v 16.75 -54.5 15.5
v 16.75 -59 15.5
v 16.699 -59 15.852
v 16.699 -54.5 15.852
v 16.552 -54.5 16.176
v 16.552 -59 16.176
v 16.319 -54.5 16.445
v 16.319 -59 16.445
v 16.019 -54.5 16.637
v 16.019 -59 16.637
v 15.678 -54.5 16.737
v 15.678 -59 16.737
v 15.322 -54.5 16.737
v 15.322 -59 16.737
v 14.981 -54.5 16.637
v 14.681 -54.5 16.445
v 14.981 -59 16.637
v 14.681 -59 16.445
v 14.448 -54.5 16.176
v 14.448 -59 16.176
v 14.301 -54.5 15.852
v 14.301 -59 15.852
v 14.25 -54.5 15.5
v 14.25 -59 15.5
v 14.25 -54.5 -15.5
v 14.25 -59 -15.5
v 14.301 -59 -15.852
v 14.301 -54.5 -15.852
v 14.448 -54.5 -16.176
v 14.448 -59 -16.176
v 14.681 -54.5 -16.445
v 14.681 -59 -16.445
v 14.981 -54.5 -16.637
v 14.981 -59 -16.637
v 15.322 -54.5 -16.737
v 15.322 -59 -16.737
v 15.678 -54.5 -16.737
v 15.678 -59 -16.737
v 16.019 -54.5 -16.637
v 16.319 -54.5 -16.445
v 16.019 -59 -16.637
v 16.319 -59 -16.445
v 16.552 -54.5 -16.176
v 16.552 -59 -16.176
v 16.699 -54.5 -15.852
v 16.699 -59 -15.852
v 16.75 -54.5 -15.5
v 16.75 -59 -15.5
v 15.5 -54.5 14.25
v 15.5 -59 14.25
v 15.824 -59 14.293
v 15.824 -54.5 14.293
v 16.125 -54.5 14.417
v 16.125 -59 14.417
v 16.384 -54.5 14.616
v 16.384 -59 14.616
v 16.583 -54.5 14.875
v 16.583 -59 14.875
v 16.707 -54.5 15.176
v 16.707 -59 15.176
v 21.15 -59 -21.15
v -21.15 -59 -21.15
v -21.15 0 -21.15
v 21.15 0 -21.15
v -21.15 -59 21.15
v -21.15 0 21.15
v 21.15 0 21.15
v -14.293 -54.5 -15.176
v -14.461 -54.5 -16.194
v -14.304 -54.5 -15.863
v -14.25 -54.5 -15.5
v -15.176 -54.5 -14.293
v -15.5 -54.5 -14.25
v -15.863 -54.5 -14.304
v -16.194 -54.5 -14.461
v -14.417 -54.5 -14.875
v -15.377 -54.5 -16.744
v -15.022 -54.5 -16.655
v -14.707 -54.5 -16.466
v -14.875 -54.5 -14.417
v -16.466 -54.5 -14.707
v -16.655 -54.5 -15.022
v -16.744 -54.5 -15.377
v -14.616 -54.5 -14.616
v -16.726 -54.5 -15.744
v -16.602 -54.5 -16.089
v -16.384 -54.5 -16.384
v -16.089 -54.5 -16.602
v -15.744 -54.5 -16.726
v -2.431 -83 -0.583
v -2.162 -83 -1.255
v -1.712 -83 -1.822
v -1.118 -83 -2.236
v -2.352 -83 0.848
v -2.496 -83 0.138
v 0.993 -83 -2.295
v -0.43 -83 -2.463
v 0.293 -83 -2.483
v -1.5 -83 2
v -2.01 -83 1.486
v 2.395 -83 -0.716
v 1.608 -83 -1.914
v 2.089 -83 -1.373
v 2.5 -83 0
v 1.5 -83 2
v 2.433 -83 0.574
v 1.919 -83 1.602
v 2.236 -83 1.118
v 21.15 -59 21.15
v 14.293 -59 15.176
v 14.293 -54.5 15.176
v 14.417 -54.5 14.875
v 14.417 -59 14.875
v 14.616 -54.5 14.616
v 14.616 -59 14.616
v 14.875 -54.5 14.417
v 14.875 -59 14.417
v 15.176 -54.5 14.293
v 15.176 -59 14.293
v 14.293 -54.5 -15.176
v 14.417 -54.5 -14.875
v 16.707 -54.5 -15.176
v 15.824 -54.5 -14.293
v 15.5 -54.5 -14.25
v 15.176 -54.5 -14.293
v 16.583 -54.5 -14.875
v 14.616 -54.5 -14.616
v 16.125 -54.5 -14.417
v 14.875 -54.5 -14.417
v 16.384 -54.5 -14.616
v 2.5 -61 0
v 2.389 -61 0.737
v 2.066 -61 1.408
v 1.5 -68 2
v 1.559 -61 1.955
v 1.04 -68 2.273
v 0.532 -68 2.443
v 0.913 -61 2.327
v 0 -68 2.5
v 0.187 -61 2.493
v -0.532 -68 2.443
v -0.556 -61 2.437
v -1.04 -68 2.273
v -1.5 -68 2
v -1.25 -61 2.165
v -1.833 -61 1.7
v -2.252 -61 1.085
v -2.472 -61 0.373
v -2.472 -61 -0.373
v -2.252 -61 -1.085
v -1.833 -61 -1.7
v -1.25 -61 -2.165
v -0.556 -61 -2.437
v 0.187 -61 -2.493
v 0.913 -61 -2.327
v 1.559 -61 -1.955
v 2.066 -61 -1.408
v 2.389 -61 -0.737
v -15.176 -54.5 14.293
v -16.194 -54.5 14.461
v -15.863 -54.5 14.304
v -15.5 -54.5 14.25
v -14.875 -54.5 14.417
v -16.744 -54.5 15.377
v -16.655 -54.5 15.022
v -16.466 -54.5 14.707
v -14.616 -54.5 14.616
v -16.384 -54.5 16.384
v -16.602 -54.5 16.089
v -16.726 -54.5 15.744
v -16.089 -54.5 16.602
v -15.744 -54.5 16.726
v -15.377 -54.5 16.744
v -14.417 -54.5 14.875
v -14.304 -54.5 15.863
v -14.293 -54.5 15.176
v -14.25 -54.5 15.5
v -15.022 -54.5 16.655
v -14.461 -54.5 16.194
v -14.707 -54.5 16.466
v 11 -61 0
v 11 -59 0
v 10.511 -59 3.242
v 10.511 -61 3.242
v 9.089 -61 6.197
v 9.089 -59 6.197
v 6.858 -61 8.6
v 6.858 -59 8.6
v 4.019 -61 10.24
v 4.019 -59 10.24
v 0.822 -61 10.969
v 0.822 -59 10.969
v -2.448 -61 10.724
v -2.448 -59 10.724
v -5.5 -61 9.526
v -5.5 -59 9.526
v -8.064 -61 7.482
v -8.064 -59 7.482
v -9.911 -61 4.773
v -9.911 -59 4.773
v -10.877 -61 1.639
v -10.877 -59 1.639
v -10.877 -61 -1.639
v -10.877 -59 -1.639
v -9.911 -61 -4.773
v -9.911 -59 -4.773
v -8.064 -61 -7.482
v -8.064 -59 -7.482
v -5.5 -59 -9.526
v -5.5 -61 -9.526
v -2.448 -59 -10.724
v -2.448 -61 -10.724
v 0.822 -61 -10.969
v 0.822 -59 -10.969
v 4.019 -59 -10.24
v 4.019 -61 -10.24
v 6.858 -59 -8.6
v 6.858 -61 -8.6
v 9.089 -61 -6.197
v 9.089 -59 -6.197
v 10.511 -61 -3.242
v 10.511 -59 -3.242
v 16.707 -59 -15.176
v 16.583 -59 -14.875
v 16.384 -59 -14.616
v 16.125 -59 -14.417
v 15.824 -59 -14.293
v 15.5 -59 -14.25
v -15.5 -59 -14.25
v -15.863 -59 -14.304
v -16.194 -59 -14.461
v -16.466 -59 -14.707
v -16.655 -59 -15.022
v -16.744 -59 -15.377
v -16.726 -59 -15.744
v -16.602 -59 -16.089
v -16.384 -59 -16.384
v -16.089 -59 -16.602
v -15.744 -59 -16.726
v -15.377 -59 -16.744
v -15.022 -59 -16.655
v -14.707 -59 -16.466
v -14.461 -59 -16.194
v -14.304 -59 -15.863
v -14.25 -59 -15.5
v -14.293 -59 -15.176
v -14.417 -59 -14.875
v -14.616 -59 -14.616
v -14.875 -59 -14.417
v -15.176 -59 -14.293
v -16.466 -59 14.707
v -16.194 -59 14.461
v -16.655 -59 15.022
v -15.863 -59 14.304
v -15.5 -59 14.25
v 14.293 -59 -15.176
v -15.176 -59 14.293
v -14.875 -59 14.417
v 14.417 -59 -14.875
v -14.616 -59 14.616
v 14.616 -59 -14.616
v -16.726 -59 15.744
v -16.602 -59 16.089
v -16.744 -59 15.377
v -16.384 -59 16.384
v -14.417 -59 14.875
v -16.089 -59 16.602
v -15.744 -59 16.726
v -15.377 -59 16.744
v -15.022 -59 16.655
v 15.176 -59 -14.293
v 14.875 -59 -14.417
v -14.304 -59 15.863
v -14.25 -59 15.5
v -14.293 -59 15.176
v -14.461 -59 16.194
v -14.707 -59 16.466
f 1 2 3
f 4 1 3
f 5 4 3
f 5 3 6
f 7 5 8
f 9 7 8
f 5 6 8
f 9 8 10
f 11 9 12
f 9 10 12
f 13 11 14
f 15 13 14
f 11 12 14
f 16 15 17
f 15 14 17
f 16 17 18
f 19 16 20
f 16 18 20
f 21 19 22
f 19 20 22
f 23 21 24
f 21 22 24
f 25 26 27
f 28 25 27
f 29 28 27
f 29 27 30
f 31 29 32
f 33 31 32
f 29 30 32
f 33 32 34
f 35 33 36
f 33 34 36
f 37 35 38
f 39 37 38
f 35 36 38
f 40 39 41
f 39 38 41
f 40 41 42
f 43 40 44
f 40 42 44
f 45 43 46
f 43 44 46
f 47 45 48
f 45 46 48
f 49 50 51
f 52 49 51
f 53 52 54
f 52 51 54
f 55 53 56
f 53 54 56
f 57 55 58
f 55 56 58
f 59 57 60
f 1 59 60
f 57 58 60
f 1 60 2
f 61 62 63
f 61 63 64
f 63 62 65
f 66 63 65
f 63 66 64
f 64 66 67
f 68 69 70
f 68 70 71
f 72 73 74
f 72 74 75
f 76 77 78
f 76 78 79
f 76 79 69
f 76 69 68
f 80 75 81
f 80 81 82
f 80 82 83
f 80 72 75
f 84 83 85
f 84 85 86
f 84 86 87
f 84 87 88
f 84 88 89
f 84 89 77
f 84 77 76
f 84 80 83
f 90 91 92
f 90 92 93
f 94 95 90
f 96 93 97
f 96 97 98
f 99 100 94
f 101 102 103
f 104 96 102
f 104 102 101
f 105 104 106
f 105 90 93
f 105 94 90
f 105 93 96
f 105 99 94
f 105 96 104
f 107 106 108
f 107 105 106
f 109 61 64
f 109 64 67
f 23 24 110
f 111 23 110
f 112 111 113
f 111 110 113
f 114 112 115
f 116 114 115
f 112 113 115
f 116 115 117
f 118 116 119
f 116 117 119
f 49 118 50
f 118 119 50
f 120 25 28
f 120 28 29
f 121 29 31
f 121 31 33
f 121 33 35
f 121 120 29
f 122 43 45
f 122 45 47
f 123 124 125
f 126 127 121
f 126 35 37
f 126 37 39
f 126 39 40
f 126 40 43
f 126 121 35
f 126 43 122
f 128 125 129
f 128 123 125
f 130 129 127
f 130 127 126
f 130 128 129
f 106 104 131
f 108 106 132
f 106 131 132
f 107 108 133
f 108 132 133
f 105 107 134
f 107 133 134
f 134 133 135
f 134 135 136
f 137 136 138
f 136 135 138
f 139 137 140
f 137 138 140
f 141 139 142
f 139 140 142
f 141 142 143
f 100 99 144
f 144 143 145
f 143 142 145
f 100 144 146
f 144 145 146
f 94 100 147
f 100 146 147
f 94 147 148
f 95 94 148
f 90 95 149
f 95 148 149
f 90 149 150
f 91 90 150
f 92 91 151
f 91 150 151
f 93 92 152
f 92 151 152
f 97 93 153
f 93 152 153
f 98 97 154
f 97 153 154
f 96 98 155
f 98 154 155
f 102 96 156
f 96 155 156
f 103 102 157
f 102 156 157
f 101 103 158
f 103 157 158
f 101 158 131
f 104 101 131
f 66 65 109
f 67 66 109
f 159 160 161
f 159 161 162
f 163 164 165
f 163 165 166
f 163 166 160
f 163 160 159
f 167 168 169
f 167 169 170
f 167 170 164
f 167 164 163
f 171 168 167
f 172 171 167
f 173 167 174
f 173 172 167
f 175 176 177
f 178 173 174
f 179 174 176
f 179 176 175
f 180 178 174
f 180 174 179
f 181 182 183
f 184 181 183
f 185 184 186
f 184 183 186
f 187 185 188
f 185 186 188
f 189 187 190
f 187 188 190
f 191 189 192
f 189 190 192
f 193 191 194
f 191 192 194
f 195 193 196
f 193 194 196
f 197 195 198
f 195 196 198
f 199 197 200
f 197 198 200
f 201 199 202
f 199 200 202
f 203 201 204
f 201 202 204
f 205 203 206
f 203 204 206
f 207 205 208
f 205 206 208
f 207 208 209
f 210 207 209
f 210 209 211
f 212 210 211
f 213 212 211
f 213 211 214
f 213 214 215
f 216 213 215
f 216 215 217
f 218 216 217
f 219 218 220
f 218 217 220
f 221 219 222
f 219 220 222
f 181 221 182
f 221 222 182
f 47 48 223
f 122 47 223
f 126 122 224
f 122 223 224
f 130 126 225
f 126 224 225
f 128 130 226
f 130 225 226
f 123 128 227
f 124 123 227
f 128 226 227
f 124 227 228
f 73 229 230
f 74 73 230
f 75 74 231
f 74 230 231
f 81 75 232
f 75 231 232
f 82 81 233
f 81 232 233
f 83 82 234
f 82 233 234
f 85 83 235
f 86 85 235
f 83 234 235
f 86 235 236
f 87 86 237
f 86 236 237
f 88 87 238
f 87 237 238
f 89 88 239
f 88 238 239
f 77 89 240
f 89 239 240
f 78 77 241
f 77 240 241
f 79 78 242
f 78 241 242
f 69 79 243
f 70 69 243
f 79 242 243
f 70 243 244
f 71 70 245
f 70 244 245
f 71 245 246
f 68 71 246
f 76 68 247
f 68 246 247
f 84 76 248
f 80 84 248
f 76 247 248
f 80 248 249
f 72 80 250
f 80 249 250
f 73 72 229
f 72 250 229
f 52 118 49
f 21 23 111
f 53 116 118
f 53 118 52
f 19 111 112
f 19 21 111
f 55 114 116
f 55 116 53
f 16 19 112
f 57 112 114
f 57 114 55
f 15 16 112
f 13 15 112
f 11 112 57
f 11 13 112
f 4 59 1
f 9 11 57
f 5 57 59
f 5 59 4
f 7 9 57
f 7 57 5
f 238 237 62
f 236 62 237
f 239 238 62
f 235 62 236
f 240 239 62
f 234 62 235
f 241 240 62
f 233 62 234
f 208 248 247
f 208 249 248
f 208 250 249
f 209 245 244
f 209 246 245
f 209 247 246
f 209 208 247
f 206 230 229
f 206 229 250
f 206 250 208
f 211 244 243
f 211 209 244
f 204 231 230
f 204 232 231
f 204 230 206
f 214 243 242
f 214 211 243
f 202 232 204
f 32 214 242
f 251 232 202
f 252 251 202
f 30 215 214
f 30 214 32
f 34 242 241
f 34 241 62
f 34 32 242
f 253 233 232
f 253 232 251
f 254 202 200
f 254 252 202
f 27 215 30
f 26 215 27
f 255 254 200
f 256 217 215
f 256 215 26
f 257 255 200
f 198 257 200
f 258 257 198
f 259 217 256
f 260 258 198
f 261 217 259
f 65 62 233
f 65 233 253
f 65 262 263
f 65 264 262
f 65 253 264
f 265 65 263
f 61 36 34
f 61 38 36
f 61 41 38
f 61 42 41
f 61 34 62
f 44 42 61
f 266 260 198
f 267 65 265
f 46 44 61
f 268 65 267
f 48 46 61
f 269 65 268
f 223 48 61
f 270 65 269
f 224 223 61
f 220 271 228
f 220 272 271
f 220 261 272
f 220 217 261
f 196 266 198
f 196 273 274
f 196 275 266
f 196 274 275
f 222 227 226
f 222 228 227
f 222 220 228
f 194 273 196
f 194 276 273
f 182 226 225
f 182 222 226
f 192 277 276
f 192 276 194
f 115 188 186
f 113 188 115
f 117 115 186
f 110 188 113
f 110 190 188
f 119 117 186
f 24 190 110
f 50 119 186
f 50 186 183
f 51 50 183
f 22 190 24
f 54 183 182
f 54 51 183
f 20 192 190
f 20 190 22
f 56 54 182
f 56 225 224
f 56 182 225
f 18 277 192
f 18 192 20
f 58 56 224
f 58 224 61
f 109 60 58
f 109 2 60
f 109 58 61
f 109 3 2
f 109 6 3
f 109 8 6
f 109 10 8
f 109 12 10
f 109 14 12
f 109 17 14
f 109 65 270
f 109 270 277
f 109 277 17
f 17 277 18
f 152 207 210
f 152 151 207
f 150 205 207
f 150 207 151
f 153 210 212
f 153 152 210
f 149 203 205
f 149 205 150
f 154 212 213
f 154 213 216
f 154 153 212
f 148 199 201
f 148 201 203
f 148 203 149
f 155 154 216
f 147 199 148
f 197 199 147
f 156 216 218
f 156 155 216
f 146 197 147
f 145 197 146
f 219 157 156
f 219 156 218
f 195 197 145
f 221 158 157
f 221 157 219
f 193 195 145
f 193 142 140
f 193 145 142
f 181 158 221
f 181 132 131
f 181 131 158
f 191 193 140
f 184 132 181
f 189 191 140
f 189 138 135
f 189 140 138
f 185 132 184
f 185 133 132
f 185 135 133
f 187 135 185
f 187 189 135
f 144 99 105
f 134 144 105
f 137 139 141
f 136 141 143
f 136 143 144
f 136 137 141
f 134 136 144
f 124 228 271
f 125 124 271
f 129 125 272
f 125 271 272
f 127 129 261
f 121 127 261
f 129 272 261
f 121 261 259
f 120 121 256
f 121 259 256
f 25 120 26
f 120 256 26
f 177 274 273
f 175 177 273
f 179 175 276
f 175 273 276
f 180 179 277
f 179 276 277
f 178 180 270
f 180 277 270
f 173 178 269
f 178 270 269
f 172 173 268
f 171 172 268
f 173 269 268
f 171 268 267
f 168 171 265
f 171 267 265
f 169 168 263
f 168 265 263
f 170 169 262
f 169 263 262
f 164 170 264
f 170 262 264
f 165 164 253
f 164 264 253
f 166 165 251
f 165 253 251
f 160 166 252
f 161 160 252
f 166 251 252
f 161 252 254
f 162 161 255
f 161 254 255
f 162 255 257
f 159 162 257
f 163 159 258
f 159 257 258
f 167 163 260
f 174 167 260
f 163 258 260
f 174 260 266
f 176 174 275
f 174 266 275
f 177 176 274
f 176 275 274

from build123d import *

# Parameters (mm, degrees)
F0_W     = 42.3
F0_H     = 42.3
F1_DEPTH = 59
F2_R     = 11
F3_DEPTH = 2
F4_R     = 2.5
F5_DEPTH = 22
F7_DEPTH = 15
F9_DEPTH = 4.5


with BuildPart() as f1:
    # F0 (on Front) → F1 (new body)
    with BuildSketch(Plane.XZ):
        Rectangle(F0_W, F0_H)
    extrude(amount=F1_DEPTH)

    # F2 (on face) → F3 (join)
    with BuildSketch(Plane.XZ.offset(59)):
        Circle(F2_R)
    extrude(amount=F3_DEPTH)

    # F4 (on face) → F5 (join)
    with BuildSketch(Plane.XZ.offset(61)):
        Circle(F4_R)
    extrude(amount=F5_DEPTH)

    # F6 (on face) → F7 (cut)
    with BuildSketch(Plane.XZ.offset(83)):
        with BuildLine():
            ThreePointArc((0, 2.5), (-0.790569, 2.371708), (-1.5, 2))
            Line((-1.5, 2), (0, 2))
            Line((0, 2), (0, 2.5))
        make_face()
        with BuildLine():
            Line((0, 2.5), (0, 2))
            Line((0, 2), (1.5, 2))
            ThreePointArc((1.5, 2), (0.790569, 2.371708), (0, 2.5))
        make_face()
    extrude(amount=-F7_DEPTH, mode=Mode.SUBTRACT)

    # F8 (on face) → F9 (cut)
    with BuildSketch(Plane.XZ.offset(59)):
        with BuildLine():
            ThreePointArc((16.75, 15.5), (15.5, 16.75), (14.25, 15.5))
            Line((14.25, 15.5), (15.5, 15.5))
            Line((15.5, 15.5), (15.5, 14.25))
            ThreePointArc((15.5, 14.25), (16.383883, 14.616117), (16.75, 15.5))
        make_face()
        with BuildLine():
            Line((15.5, 15.5), (14.25, 15.5))
            ThreePointArc((14.25, 15.5), (14.616117, 14.616117), (15.5, 14.25))
            Line((15.5, 14.25), (15.5, 15.5))
        make_face()
        with BuildLine():
            Line((-15.5, 14.25), (-15.5, 15.5))
            Line((-15.5, 15.5), (-14.25, 15.5))
            ThreePointArc((-14.25, 15.5), (-16.383883, 16.383883), (-15.5, 14.25))
        make_face()
        with BuildLine():
            Line((-14.25, 15.5), (-15.5, 15.5))
            Line((-15.5, 15.5), (-15.5, 14.25))
            ThreePointArc((-15.5, 14.25), (-14.616117, 14.616117), (-14.25, 15.5))
        make_face()
        with BuildLine():
            Line((-15.5, -15.5), (-15.5, -14.25))
            ThreePointArc((-15.5, -14.25), (-16.383883, -16.383883), (-14.25, -15.5))
            Line((-14.25, -15.5), (-15.5, -15.5))
        make_face()
        with BuildLine():
            ThreePointArc((-14.25, -15.5), (-14.616117, -14.616117), (-15.5, -14.25))
            Line((-15.5, -14.25), (-15.5, -15.5))
            Line((-15.5, -15.5), (-14.25, -15.5))
        make_face()
        with BuildLine():
            Line((15.5, -15.5), (15.5, -14.25))
            ThreePointArc((15.5, -14.25), (14.616117, -14.616117), (14.25, -15.5))
            Line((14.25, -15.5), (15.5, -15.5))
        make_face()
        with BuildLine():
            ThreePointArc((16.75, -15.5), (16.383883, -14.616117), (15.5, -14.25))
            Line((15.5, -14.25), (15.5, -15.5))
            Line((15.5, -15.5), (14.25, -15.5))
            ThreePointArc((14.25, -15.5), (15.5, -16.75), (16.75, -15.5))
        make_face()
    extrude(amount=-F9_DEPTH, mode=Mode.SUBTRACT)


solid = f1.part
